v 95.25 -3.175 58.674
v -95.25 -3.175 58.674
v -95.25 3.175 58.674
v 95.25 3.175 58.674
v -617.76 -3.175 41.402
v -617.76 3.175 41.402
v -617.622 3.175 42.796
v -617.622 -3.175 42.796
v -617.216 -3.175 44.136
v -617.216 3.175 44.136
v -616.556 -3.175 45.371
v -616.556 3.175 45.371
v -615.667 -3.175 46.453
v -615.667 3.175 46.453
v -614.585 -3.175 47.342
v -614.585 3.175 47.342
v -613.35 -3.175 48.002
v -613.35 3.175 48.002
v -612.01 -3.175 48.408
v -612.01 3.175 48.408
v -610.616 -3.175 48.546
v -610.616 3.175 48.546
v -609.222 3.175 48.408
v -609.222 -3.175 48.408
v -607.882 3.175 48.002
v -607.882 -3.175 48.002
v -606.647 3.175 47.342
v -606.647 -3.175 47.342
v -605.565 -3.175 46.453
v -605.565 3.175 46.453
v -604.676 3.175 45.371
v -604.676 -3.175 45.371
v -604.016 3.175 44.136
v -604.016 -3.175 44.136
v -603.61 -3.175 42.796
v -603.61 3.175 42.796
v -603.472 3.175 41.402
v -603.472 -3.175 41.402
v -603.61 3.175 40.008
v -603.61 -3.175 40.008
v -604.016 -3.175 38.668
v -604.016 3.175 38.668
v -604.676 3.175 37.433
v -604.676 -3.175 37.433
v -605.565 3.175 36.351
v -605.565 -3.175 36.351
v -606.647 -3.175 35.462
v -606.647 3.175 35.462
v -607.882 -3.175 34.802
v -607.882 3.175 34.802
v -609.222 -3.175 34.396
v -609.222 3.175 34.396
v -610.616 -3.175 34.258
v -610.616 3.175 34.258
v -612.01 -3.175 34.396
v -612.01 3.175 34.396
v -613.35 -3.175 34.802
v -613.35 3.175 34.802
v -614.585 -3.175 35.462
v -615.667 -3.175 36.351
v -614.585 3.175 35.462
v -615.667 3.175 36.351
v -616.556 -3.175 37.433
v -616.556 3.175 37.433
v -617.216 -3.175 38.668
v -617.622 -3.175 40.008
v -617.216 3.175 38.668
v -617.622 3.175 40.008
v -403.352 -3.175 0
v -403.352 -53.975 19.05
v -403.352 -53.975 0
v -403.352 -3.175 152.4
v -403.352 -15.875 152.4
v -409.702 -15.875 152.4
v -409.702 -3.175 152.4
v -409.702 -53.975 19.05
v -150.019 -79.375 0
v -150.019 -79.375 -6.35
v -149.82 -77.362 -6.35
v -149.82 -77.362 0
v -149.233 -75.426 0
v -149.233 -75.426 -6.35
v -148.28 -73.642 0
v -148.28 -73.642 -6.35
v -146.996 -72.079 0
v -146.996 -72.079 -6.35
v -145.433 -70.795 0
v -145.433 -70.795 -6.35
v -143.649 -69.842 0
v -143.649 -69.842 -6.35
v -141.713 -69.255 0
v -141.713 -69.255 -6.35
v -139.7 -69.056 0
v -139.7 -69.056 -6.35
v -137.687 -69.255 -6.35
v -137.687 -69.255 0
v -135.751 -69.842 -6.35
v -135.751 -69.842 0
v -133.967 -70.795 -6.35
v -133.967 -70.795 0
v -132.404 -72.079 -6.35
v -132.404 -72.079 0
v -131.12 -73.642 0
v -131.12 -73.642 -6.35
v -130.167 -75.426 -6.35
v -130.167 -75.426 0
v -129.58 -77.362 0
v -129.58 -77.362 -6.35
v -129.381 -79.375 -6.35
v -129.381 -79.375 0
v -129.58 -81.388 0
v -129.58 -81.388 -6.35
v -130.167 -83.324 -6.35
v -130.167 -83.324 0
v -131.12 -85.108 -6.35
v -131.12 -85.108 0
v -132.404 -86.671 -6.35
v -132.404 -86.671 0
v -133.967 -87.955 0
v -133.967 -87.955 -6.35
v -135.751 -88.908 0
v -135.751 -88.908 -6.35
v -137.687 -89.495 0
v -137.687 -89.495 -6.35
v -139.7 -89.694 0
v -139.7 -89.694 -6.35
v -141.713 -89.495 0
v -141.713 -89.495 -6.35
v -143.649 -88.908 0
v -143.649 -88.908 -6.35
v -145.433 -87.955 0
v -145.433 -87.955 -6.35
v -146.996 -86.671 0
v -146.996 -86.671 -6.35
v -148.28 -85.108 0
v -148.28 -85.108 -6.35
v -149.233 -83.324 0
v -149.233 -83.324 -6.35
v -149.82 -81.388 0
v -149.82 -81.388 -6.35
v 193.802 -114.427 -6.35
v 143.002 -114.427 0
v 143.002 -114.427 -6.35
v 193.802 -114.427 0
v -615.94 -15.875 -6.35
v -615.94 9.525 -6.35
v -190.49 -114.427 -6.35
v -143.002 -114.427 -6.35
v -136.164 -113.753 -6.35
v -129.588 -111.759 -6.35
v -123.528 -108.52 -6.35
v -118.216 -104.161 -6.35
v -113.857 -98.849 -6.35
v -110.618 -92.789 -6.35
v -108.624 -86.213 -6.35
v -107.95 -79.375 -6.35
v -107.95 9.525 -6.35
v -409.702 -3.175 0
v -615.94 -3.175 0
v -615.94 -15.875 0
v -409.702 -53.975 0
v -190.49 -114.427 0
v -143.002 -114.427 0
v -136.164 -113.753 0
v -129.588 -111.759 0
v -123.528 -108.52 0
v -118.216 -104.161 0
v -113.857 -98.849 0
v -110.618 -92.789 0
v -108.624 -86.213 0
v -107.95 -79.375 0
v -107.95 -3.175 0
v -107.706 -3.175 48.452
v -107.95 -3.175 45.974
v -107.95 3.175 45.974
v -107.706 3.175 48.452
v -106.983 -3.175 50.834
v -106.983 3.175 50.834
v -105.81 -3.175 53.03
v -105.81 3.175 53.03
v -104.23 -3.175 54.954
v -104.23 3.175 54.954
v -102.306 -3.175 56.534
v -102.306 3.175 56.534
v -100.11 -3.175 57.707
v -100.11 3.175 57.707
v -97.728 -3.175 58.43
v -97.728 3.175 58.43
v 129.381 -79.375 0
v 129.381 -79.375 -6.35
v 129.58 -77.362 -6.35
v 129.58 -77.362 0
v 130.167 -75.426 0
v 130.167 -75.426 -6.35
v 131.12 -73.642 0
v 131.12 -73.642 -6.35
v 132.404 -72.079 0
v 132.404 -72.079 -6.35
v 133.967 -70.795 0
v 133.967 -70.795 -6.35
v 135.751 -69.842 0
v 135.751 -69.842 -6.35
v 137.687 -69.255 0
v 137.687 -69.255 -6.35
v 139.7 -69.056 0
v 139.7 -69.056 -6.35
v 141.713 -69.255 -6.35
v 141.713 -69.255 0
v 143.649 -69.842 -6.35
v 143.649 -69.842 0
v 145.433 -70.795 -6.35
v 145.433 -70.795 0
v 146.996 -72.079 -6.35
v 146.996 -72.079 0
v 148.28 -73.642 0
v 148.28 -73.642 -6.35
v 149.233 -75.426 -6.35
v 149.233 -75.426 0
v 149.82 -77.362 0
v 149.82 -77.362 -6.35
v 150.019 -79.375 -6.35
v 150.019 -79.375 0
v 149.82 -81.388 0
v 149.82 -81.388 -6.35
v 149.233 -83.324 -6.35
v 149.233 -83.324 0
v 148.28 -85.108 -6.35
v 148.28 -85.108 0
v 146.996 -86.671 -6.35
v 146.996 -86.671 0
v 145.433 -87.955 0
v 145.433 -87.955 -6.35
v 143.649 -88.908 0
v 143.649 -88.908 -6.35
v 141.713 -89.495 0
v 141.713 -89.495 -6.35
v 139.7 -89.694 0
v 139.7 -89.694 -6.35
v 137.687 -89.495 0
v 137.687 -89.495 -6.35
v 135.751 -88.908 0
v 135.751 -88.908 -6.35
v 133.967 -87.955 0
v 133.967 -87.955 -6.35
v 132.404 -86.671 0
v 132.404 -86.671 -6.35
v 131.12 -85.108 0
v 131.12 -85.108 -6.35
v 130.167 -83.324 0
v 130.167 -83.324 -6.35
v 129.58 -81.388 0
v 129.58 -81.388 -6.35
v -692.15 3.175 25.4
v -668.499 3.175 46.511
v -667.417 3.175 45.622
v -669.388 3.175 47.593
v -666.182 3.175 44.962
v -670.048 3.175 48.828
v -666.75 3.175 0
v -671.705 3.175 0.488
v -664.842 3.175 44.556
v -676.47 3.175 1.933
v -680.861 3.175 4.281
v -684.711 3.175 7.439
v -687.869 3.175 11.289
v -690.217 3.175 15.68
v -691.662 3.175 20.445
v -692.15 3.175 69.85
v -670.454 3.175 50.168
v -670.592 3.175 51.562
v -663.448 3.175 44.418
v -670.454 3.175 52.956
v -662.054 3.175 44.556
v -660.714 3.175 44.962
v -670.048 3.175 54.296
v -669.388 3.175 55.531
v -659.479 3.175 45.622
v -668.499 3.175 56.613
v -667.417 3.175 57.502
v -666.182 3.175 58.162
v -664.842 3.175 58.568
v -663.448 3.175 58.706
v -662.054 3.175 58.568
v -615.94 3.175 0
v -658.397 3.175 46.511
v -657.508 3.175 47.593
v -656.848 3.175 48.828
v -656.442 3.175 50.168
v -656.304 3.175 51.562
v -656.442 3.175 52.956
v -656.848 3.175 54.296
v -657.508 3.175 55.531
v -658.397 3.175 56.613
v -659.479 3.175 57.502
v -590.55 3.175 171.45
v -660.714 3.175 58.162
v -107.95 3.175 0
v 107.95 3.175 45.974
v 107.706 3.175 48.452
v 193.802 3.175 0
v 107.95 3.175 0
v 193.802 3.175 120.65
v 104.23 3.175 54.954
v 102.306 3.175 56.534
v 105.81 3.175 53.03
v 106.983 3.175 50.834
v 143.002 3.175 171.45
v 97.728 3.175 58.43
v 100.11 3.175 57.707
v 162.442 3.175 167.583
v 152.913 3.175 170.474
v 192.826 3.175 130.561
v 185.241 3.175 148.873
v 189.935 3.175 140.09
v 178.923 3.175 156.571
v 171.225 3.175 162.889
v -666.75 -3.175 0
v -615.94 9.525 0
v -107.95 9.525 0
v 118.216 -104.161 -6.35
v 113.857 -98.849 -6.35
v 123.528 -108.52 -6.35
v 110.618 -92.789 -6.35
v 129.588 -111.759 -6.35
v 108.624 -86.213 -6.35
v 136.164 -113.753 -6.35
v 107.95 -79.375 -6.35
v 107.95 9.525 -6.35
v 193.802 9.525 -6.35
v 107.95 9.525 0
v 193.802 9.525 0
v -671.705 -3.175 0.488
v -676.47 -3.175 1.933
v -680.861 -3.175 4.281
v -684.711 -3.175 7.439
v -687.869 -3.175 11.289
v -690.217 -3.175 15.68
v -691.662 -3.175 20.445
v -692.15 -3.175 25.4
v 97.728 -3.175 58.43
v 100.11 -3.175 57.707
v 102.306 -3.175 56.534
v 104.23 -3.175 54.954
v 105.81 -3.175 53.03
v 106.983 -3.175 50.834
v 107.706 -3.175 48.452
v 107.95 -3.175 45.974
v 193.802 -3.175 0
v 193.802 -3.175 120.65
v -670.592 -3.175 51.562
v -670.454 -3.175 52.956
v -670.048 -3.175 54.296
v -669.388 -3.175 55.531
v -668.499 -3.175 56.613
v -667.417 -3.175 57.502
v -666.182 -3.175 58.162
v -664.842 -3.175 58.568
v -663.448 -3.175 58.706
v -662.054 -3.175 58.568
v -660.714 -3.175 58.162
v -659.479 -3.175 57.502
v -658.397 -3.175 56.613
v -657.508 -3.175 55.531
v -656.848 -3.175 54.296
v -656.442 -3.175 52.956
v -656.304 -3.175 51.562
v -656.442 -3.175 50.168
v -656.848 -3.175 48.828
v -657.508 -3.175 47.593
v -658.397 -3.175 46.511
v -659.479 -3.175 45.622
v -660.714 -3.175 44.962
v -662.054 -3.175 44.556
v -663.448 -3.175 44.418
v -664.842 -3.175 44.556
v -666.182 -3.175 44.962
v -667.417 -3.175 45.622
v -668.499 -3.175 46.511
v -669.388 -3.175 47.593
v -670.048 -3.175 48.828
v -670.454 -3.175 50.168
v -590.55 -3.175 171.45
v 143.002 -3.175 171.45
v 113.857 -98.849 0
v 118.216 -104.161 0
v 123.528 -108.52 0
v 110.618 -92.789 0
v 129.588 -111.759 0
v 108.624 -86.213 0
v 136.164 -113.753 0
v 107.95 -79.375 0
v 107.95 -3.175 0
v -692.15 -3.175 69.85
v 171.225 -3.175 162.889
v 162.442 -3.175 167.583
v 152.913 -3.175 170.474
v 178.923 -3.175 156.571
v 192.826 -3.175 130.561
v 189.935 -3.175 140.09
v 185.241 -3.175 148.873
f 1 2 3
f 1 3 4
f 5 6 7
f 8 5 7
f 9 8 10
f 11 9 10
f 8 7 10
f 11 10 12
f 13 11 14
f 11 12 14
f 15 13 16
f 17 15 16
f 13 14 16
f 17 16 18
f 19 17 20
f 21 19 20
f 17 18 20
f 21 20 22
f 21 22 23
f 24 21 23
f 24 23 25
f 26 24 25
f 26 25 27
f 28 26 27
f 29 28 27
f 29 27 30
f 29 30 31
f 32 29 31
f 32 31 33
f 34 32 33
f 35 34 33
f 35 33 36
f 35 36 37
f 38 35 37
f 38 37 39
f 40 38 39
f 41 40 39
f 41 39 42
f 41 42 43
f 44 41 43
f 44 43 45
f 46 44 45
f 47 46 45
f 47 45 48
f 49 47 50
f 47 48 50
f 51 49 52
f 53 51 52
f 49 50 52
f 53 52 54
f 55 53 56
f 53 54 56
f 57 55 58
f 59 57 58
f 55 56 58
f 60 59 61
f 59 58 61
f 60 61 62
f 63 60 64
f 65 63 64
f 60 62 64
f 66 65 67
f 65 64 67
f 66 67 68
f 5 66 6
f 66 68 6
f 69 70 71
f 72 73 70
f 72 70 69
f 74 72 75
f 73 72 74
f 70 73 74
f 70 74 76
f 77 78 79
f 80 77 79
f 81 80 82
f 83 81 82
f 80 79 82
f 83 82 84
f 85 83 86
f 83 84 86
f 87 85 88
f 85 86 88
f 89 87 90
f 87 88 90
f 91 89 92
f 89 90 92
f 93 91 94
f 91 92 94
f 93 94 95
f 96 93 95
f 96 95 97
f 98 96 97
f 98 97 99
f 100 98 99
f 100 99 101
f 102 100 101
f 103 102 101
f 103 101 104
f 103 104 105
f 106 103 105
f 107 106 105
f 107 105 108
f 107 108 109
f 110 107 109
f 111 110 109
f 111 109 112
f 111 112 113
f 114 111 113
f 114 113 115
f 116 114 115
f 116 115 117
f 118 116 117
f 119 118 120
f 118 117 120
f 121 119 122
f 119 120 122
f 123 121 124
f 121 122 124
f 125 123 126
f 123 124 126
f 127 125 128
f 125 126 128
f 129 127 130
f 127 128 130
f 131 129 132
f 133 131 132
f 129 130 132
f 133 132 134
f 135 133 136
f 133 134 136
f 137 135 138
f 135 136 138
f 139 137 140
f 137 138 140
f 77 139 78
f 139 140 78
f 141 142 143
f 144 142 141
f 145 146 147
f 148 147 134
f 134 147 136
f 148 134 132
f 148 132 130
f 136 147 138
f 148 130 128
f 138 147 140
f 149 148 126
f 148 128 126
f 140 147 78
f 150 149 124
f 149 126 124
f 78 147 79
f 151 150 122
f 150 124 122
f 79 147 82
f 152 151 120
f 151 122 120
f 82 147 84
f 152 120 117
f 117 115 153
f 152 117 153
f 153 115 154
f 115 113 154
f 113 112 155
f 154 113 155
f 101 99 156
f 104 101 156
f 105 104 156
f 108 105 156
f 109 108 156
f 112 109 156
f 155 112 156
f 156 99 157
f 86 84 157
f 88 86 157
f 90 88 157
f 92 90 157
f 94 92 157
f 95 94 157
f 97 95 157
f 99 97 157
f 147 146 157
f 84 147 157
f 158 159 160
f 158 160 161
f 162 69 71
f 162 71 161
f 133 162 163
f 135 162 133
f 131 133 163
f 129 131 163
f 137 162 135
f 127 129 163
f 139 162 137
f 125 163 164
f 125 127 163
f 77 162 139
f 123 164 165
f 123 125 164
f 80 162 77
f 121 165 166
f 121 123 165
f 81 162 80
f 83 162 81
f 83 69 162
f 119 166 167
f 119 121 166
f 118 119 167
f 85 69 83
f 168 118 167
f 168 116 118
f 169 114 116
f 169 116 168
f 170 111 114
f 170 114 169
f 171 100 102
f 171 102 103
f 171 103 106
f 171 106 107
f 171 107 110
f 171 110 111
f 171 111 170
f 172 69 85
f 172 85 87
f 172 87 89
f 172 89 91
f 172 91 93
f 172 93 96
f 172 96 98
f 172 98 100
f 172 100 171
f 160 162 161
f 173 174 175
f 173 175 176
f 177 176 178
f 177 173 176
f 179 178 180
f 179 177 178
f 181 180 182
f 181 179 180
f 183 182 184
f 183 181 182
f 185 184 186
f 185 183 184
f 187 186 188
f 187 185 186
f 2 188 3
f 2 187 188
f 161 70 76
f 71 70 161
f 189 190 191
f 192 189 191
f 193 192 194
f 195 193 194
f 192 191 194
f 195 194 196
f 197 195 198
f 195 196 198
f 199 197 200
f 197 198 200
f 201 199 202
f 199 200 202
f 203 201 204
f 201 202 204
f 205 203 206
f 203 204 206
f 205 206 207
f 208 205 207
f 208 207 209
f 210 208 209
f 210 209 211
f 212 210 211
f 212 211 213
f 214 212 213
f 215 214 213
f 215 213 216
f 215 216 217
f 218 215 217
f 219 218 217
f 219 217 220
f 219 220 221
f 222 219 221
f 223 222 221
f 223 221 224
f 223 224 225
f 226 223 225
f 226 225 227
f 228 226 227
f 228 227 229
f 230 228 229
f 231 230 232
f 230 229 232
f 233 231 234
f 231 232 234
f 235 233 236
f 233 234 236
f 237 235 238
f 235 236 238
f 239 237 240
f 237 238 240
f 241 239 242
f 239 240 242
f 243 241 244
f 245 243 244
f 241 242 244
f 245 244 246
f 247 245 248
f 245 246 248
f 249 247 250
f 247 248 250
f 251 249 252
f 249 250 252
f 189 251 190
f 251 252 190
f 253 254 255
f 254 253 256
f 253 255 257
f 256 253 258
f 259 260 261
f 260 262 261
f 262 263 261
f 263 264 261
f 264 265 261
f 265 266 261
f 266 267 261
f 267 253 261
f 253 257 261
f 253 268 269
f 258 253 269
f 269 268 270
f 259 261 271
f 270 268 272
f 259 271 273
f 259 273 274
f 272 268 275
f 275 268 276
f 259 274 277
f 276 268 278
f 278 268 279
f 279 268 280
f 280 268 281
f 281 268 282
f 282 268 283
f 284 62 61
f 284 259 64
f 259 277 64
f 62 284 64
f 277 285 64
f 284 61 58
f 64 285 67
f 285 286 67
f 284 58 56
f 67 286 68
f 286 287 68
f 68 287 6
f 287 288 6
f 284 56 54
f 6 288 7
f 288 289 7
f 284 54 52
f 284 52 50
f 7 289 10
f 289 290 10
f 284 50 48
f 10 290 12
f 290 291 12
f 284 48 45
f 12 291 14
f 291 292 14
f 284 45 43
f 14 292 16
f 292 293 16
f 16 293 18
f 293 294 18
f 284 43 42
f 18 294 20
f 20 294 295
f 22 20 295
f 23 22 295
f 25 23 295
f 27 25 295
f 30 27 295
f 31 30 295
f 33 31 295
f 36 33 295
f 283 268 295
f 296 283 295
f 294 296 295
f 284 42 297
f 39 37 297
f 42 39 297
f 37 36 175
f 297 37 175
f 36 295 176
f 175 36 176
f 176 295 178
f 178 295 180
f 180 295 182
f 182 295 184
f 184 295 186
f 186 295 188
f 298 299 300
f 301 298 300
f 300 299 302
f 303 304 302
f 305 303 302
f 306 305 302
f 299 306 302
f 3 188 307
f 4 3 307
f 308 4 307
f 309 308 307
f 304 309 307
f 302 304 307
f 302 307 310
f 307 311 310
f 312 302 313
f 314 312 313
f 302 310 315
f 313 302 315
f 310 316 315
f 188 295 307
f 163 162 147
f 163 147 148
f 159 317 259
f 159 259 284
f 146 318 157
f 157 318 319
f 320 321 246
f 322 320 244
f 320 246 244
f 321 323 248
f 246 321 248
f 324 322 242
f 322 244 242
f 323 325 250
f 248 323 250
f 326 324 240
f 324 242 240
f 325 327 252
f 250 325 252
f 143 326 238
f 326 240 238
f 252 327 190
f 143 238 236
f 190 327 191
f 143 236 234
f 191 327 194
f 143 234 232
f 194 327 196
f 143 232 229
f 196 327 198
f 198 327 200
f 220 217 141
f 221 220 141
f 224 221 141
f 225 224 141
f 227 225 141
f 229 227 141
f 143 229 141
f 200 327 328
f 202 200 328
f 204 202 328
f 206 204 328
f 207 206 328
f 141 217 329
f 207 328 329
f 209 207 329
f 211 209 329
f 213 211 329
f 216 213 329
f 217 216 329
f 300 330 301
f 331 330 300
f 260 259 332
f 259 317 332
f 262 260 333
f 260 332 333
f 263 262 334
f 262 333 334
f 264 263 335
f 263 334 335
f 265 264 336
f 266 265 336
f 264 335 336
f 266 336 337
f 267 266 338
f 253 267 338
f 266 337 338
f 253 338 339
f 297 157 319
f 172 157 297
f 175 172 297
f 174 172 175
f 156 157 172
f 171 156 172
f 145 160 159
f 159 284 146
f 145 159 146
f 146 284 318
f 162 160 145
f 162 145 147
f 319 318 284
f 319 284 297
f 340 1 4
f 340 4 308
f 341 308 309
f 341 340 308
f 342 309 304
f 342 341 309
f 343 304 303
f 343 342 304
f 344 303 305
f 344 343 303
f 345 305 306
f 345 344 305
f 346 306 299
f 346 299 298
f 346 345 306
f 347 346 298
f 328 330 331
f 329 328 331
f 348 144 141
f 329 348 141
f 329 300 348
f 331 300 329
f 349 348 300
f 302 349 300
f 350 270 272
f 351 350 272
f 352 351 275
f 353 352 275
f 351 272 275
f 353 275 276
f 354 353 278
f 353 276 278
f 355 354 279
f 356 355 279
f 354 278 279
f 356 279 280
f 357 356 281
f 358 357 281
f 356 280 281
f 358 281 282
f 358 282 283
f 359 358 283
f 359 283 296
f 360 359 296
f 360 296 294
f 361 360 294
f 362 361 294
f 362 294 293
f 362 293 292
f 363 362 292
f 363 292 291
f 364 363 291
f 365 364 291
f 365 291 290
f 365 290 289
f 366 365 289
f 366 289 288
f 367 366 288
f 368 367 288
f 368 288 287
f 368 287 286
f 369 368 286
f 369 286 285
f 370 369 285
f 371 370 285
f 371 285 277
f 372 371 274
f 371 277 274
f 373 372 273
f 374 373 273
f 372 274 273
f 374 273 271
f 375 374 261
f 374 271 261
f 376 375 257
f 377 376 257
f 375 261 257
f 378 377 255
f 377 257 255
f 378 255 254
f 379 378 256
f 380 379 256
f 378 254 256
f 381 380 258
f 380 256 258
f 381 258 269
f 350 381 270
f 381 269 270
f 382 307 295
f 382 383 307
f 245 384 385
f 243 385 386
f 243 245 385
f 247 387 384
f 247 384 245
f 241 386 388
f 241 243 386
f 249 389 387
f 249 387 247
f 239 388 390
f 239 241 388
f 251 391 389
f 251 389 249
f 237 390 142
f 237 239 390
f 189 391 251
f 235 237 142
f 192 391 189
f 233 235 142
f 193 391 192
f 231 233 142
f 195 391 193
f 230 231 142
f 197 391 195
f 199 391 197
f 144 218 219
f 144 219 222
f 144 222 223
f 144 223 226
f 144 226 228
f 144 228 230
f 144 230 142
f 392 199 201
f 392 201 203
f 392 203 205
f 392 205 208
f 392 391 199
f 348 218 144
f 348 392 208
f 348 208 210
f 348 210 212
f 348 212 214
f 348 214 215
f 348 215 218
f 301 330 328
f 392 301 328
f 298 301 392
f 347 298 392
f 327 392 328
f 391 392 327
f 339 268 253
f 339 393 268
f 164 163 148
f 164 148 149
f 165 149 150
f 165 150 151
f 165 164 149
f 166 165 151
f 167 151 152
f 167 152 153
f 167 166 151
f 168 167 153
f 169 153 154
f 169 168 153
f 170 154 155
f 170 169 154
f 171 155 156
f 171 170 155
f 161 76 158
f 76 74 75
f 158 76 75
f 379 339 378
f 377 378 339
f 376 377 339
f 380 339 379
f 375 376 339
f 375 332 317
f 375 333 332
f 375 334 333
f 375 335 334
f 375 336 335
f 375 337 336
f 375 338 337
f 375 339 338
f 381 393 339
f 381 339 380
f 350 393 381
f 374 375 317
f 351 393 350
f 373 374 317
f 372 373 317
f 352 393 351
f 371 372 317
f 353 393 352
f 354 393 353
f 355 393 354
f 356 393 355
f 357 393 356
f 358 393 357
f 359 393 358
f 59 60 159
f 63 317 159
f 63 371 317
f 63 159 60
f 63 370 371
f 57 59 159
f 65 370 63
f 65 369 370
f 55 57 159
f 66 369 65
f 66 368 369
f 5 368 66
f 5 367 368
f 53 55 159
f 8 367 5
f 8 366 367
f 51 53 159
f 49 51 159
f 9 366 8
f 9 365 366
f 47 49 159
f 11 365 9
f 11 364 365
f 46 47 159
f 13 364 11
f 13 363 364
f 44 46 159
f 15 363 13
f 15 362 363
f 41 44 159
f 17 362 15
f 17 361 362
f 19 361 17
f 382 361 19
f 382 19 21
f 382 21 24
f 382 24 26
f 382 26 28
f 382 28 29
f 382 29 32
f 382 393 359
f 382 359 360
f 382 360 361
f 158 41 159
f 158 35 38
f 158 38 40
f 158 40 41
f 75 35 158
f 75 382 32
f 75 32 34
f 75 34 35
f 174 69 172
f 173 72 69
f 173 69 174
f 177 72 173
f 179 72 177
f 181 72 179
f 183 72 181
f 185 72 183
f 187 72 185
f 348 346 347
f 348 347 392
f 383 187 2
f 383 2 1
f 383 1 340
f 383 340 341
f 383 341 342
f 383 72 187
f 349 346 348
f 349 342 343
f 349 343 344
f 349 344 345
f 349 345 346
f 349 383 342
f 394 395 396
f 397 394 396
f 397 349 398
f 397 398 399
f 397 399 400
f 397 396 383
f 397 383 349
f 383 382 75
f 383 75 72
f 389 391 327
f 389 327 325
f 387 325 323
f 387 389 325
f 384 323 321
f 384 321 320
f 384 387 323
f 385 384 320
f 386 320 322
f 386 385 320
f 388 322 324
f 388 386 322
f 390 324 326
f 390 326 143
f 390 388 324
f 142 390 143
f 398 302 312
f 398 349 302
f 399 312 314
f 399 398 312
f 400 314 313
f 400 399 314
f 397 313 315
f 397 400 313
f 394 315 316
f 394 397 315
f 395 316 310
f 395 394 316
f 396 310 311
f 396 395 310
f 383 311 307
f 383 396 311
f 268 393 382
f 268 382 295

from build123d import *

# Parameters (mm, degrees)
F1_DEPTH  = 3.175
F2_SIZE   = 101.6
F4_D      = 14.2875
F5_W      = 85.852
F5_H      = 25.4
F5_W_2    = 507.99026
F6_DEPTH  = 6.35
F8_D      = 20.6375
F11_DEPTH = 6.35
F12_R     = 25.4


with BuildPart() as f1:
    # F0 (on Front) → F1 (new body, symmetric)
    with BuildSketch(Plane.XZ):
        with BuildLine():
            Line((-692.15, 171.45), (-692.15, 0))
            Line((-692.15, 0), (-107.95, 0))
            Line((-107.95, 0), (-107.95, 45.974))
            ThreePointArc((-107.95, 45.974), (-104.230256, 54.954256), (-95.25, 58.674))
            Line((-95.25, 58.674), (95.25, 58.674))
            ThreePointArc((95.25, 58.674), (104.230256, 54.954256), (107.95, 45.974))
            Line((107.95, 45.974), (107.95, 0))
            Line((107.95, 0), (193.802, 0))
            Line((193.802, 0), (193.802, 120.65))
            ThreePointArc((193.802, 120.65), (178.923024, 156.571024), (143.002, 171.45))
            Line((143.002, 171.45), (-692.15, 171.45))
        make_face()
    extrude(amount=F1_DEPTH, both=True)

    # F2
    f2_edges = [f1.edges().sort_by_distance(p)[0] for p in [
        (-692.15, 0, 171.45),
    ]]
    chamfer(f2_edges, length=F2_SIZE)

    # F4 (through all)
    with Locations(Plane.XZ.offset(3.175)):
        with Locations((-610.616, 41.402), (-663.448, 51.562)):
            Hole(F4_D / 2)

    # F5 (on Top) → F6 (join)
    with BuildSketch(Plane.XY):
        with Locations((150.876, -3.175)):
            Rectangle(F5_W, F5_H)
        with Locations((-361.94513, -3.175)):
            Rectangle(F5_W_2, F5_H)
        with BuildLine():
            Line((-107.95, -15.875), (-615.94026, -15.875))
            Line((-615.94026, -15.875), (-190.49026, -114.427))
            Line((-190.49026, -114.427), (-143.002, -114.427))
            ThreePointArc((-143.002, -114.427), (-118.216493, -104.160507), (-107.95, -79.375))
            Line((-107.95, -79.375), (-107.95, -15.875))
        make_face()
        with BuildLine():
            Line((193.802, -15.875), (107.95, -15.875))
            Line((107.95, -15.875), (107.95, -79.375))
            ThreePointArc((107.95, -79.375), (118.216493, -104.160507), (143.002, -114.427))
            Line((143.002, -114.427), (193.802, -114.427))
            Line((193.802, -114.427), (193.802, -15.875))
        make_face()
    extrude(amount=-F6_DEPTH)

    # F8 (through all)
    with Locations(Plane.XY):
        with Locations((-139.7, -79.375), (139.7, -79.375)):
            Hole(F8_D / 2)

    # F10 (on offset) → F11 (join)
    with BuildSketch(Plane.YZ.offset(-403.352)):
        Polygon((-53.975, 0), (-3.175, 0), (-3.175, 152.4), (-15.875, 152.4), (-53.975, 19.05), align=None)
    extrude(amount=-F11_DEPTH)

    # F12
    f12_edges = [f1.edges().sort_by_distance(p)[0] for p in [
        (-692.15, 0, 0),
    ]]
    fillet(f12_edges, radius=F12_R)


solid = f1.part
